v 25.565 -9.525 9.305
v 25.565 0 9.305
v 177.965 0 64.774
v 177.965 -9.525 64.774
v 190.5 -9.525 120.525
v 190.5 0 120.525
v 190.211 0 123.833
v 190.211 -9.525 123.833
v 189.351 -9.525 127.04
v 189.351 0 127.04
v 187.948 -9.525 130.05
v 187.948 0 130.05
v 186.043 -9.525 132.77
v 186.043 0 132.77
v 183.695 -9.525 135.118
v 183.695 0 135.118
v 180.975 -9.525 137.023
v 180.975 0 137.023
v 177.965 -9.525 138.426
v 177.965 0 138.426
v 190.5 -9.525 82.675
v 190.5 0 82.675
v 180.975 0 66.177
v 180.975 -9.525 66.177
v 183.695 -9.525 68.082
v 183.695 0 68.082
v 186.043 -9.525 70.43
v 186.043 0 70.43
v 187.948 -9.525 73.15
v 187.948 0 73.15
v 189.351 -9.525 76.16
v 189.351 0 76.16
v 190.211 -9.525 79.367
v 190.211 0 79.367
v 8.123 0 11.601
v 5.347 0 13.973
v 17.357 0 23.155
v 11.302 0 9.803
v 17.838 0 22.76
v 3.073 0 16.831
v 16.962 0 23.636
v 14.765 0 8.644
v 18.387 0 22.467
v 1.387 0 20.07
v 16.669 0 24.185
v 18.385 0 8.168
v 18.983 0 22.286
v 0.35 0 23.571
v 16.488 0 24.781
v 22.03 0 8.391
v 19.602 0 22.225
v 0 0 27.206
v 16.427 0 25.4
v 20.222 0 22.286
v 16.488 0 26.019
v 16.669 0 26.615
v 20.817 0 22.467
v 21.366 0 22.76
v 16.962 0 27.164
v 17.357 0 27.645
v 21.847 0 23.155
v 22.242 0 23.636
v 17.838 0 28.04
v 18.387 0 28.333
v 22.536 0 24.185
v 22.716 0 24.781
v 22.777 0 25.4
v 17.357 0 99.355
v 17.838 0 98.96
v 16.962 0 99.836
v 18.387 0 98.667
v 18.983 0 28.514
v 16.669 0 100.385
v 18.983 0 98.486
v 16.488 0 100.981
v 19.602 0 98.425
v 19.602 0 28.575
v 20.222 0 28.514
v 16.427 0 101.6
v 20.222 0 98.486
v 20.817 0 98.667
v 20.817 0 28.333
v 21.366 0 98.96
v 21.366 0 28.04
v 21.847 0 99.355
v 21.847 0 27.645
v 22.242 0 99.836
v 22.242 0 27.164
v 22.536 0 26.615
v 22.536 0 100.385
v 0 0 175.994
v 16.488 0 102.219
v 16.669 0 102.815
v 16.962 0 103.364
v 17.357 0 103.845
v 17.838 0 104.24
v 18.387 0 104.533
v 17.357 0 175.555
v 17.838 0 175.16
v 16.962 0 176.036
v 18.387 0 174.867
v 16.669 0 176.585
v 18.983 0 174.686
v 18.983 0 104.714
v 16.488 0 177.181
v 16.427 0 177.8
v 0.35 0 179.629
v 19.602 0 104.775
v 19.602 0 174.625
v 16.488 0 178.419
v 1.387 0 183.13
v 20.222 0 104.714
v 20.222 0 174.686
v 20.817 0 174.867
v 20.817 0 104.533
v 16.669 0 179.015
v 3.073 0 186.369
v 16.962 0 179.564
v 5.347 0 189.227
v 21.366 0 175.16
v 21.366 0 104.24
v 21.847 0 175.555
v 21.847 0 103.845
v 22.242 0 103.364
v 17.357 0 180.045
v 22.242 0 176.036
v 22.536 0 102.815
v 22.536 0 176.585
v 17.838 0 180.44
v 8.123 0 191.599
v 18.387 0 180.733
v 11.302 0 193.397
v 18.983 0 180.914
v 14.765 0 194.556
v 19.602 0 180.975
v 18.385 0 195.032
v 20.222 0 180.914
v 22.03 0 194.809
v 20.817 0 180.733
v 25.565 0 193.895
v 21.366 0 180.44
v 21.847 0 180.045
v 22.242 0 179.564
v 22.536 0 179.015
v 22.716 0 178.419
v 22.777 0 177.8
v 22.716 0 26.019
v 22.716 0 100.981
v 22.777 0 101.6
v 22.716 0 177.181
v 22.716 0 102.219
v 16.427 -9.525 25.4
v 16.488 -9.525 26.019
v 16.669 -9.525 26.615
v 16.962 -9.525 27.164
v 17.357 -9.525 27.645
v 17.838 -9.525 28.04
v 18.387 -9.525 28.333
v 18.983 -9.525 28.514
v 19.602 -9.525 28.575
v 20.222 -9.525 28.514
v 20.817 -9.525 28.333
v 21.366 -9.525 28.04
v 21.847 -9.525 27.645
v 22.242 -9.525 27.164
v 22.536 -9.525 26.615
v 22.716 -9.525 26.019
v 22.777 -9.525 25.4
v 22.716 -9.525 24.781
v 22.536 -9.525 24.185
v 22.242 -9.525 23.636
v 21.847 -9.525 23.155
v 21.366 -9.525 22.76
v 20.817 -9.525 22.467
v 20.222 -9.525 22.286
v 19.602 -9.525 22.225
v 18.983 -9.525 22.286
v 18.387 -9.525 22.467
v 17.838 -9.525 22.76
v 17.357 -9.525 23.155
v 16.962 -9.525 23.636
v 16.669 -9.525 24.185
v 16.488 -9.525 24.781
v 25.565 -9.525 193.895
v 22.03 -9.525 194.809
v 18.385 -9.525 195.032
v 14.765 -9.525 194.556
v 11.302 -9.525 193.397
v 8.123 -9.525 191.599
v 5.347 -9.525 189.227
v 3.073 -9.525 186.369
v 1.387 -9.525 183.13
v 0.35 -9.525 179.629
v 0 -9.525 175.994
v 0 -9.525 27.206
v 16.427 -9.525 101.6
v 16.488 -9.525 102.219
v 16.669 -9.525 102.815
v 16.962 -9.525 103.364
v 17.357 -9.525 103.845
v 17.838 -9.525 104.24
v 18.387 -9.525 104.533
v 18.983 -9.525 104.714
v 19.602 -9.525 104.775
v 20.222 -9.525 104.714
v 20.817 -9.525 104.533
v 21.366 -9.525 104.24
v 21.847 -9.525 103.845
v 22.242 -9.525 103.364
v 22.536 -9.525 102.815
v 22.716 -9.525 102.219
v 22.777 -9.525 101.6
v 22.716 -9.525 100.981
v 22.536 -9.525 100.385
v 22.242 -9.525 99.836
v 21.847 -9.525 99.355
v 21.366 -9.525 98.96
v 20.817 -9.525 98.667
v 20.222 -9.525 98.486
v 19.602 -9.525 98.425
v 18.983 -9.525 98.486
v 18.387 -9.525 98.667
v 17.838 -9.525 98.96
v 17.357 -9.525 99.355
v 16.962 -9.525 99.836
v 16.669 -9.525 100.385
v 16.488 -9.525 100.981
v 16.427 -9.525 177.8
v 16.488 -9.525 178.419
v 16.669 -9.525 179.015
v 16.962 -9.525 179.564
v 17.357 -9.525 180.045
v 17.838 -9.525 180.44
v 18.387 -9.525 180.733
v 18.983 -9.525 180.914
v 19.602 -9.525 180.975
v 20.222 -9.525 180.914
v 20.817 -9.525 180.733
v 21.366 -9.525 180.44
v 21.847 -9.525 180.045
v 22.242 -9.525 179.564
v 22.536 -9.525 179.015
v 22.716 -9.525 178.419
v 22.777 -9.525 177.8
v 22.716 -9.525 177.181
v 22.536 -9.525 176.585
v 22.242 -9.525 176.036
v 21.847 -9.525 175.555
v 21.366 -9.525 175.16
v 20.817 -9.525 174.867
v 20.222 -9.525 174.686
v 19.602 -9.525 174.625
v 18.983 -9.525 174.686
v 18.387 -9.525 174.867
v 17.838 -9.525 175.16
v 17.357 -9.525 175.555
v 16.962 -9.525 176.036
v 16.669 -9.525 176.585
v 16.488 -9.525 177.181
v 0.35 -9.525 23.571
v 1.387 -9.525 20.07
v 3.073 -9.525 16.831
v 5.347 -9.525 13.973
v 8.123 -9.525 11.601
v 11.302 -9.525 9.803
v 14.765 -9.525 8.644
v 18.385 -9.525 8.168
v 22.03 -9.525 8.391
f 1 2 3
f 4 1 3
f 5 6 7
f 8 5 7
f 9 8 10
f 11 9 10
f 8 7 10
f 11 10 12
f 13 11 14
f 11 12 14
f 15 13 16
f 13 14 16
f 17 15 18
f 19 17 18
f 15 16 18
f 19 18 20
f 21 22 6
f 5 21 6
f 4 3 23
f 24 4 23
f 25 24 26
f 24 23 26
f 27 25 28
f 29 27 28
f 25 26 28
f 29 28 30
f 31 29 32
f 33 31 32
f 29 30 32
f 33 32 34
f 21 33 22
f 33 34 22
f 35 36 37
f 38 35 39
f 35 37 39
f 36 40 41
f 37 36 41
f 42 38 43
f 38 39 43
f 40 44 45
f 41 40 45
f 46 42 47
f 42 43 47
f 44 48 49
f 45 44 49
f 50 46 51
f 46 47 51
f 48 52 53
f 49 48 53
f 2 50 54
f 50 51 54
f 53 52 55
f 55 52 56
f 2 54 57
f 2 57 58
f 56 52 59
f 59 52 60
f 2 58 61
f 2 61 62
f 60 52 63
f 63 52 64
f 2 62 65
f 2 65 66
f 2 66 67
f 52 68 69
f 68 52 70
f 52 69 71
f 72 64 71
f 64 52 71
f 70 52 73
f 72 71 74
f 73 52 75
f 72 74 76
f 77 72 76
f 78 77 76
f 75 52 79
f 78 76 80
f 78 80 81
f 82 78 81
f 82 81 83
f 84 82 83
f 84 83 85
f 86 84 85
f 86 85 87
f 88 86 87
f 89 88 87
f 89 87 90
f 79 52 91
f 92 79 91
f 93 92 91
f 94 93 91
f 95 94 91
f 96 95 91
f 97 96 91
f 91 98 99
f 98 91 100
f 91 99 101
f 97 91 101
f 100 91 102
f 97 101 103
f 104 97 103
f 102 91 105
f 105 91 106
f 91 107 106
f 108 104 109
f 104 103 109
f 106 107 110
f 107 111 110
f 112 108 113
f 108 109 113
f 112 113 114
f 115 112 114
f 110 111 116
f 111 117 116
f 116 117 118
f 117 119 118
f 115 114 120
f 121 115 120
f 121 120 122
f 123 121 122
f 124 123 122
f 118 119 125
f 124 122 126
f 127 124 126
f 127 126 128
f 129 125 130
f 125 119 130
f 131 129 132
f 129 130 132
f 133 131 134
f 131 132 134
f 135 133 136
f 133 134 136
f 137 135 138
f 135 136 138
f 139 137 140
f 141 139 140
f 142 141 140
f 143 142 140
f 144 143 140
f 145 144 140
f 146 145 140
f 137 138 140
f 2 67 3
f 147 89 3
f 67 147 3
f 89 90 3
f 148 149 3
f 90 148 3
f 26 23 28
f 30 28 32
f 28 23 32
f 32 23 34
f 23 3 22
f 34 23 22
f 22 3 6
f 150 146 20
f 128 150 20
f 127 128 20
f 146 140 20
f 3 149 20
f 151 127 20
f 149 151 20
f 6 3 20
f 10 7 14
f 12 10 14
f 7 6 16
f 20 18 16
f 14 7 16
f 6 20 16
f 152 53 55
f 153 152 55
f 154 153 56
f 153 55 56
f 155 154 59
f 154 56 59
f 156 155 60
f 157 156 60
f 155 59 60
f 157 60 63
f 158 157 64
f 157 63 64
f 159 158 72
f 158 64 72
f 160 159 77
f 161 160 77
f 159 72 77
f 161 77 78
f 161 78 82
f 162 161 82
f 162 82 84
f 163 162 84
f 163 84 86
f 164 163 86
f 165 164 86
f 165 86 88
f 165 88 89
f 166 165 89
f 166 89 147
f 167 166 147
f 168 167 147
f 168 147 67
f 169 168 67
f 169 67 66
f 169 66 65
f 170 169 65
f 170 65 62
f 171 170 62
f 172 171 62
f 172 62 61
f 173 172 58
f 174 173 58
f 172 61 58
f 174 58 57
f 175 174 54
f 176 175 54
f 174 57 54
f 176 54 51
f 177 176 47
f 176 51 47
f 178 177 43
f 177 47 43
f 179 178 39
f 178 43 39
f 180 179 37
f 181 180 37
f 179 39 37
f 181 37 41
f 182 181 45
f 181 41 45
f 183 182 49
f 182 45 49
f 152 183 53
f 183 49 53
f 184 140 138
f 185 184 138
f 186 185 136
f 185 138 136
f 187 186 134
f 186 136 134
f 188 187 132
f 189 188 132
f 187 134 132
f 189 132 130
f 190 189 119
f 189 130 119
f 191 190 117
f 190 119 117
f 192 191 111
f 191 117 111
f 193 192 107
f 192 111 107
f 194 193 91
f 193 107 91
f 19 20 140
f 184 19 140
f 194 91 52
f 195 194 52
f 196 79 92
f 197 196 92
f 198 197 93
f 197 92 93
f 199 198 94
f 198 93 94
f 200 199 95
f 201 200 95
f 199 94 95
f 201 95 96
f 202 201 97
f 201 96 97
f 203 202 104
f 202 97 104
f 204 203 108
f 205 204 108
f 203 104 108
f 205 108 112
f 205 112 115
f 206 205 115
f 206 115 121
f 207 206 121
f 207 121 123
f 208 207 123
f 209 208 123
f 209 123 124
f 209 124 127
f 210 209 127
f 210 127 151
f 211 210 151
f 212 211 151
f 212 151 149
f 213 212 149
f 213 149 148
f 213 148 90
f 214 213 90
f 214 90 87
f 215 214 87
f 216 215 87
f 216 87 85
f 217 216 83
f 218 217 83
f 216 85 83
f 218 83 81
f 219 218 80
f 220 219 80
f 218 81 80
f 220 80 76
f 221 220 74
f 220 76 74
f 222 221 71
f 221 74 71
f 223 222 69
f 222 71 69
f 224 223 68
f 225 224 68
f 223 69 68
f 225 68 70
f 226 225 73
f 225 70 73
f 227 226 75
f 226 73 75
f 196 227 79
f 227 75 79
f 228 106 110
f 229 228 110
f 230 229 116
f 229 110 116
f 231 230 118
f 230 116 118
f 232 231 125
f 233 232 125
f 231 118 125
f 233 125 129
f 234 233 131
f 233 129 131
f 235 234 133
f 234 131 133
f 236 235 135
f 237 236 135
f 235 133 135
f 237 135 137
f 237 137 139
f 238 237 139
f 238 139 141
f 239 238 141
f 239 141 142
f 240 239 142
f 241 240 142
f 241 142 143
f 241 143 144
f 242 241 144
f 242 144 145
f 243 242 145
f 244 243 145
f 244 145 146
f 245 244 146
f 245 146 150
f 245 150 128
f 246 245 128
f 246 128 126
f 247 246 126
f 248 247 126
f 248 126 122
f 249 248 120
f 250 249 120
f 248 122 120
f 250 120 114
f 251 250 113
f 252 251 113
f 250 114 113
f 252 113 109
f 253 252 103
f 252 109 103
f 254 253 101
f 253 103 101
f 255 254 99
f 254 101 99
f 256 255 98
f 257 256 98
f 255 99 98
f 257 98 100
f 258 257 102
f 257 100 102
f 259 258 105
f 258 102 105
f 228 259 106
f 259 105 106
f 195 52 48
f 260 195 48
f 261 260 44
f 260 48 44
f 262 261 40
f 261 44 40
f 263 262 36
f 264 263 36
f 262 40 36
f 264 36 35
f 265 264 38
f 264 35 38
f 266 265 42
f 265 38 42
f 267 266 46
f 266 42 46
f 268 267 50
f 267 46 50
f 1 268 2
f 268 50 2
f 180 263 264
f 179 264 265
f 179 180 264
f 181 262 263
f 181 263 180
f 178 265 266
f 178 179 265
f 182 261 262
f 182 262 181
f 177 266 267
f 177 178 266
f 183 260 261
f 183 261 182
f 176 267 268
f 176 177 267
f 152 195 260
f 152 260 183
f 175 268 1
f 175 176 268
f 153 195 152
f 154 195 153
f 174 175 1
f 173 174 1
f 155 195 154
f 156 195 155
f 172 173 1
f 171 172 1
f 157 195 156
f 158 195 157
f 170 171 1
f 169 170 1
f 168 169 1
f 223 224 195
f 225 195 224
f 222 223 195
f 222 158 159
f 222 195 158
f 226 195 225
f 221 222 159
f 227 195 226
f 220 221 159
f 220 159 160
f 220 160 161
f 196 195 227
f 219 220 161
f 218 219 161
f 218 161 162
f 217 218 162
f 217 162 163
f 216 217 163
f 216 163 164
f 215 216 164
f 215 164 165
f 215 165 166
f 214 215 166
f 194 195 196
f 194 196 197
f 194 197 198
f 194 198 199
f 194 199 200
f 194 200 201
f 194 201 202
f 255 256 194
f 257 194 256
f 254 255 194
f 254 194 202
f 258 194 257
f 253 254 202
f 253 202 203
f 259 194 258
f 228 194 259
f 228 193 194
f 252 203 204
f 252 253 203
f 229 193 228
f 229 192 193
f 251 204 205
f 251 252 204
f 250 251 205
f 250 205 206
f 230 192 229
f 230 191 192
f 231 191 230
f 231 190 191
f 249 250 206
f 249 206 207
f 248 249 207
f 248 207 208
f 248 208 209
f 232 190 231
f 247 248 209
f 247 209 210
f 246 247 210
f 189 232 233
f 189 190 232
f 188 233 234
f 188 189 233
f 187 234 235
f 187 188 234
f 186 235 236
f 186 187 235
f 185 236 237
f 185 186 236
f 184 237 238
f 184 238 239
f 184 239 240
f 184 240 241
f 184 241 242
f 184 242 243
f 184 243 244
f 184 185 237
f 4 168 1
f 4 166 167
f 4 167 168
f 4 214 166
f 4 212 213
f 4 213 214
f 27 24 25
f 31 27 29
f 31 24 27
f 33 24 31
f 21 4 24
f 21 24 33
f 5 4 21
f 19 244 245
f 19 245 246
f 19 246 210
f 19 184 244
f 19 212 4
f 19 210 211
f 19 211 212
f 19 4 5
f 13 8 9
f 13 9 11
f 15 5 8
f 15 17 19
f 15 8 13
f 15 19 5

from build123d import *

# Parameters (mm, degrees)
F1_DEPTH = 9.525
F3_D     = 6.35


with BuildPart() as f1:
    # F0 (on Front) → F1 (new body)
    with BuildSketch(Plane.XZ):
        with BuildLine():
            Line((0, 175.99378), (0, 27.20622))
            ThreePointArc((0, 27.20622), (8.123369, 11.601373), (25.565484, 9.305075))
            Line((25.565484, 9.305075), (177.965484, 64.774139))
            ThreePointArc((177.965484, 64.774139), (187.054846, 71.748652), (190.5, 82.675283))
            Line((190.5, 82.675283), (190.5, 120.524717))
            ThreePointArc((190.5, 120.524717), (187.054846, 131.451348), (177.965484, 138.425861))
            Line((177.965484, 138.425861), (25.565484, 193.894925))
            ThreePointArc((25.565484, 193.894925), (8.123369, 191.598627), (0, 175.99378))
        make_face()
    extrude(amount=F1_DEPTH)

    # F3 (through all)
    with Locations(Plane.XZ.offset(9.525)):
        with Locations((19.602309, 177.8), (19.602309, 101.6), (19.602309, 25.4)):
            Hole(F3_D / 2)


solid = f1.part
